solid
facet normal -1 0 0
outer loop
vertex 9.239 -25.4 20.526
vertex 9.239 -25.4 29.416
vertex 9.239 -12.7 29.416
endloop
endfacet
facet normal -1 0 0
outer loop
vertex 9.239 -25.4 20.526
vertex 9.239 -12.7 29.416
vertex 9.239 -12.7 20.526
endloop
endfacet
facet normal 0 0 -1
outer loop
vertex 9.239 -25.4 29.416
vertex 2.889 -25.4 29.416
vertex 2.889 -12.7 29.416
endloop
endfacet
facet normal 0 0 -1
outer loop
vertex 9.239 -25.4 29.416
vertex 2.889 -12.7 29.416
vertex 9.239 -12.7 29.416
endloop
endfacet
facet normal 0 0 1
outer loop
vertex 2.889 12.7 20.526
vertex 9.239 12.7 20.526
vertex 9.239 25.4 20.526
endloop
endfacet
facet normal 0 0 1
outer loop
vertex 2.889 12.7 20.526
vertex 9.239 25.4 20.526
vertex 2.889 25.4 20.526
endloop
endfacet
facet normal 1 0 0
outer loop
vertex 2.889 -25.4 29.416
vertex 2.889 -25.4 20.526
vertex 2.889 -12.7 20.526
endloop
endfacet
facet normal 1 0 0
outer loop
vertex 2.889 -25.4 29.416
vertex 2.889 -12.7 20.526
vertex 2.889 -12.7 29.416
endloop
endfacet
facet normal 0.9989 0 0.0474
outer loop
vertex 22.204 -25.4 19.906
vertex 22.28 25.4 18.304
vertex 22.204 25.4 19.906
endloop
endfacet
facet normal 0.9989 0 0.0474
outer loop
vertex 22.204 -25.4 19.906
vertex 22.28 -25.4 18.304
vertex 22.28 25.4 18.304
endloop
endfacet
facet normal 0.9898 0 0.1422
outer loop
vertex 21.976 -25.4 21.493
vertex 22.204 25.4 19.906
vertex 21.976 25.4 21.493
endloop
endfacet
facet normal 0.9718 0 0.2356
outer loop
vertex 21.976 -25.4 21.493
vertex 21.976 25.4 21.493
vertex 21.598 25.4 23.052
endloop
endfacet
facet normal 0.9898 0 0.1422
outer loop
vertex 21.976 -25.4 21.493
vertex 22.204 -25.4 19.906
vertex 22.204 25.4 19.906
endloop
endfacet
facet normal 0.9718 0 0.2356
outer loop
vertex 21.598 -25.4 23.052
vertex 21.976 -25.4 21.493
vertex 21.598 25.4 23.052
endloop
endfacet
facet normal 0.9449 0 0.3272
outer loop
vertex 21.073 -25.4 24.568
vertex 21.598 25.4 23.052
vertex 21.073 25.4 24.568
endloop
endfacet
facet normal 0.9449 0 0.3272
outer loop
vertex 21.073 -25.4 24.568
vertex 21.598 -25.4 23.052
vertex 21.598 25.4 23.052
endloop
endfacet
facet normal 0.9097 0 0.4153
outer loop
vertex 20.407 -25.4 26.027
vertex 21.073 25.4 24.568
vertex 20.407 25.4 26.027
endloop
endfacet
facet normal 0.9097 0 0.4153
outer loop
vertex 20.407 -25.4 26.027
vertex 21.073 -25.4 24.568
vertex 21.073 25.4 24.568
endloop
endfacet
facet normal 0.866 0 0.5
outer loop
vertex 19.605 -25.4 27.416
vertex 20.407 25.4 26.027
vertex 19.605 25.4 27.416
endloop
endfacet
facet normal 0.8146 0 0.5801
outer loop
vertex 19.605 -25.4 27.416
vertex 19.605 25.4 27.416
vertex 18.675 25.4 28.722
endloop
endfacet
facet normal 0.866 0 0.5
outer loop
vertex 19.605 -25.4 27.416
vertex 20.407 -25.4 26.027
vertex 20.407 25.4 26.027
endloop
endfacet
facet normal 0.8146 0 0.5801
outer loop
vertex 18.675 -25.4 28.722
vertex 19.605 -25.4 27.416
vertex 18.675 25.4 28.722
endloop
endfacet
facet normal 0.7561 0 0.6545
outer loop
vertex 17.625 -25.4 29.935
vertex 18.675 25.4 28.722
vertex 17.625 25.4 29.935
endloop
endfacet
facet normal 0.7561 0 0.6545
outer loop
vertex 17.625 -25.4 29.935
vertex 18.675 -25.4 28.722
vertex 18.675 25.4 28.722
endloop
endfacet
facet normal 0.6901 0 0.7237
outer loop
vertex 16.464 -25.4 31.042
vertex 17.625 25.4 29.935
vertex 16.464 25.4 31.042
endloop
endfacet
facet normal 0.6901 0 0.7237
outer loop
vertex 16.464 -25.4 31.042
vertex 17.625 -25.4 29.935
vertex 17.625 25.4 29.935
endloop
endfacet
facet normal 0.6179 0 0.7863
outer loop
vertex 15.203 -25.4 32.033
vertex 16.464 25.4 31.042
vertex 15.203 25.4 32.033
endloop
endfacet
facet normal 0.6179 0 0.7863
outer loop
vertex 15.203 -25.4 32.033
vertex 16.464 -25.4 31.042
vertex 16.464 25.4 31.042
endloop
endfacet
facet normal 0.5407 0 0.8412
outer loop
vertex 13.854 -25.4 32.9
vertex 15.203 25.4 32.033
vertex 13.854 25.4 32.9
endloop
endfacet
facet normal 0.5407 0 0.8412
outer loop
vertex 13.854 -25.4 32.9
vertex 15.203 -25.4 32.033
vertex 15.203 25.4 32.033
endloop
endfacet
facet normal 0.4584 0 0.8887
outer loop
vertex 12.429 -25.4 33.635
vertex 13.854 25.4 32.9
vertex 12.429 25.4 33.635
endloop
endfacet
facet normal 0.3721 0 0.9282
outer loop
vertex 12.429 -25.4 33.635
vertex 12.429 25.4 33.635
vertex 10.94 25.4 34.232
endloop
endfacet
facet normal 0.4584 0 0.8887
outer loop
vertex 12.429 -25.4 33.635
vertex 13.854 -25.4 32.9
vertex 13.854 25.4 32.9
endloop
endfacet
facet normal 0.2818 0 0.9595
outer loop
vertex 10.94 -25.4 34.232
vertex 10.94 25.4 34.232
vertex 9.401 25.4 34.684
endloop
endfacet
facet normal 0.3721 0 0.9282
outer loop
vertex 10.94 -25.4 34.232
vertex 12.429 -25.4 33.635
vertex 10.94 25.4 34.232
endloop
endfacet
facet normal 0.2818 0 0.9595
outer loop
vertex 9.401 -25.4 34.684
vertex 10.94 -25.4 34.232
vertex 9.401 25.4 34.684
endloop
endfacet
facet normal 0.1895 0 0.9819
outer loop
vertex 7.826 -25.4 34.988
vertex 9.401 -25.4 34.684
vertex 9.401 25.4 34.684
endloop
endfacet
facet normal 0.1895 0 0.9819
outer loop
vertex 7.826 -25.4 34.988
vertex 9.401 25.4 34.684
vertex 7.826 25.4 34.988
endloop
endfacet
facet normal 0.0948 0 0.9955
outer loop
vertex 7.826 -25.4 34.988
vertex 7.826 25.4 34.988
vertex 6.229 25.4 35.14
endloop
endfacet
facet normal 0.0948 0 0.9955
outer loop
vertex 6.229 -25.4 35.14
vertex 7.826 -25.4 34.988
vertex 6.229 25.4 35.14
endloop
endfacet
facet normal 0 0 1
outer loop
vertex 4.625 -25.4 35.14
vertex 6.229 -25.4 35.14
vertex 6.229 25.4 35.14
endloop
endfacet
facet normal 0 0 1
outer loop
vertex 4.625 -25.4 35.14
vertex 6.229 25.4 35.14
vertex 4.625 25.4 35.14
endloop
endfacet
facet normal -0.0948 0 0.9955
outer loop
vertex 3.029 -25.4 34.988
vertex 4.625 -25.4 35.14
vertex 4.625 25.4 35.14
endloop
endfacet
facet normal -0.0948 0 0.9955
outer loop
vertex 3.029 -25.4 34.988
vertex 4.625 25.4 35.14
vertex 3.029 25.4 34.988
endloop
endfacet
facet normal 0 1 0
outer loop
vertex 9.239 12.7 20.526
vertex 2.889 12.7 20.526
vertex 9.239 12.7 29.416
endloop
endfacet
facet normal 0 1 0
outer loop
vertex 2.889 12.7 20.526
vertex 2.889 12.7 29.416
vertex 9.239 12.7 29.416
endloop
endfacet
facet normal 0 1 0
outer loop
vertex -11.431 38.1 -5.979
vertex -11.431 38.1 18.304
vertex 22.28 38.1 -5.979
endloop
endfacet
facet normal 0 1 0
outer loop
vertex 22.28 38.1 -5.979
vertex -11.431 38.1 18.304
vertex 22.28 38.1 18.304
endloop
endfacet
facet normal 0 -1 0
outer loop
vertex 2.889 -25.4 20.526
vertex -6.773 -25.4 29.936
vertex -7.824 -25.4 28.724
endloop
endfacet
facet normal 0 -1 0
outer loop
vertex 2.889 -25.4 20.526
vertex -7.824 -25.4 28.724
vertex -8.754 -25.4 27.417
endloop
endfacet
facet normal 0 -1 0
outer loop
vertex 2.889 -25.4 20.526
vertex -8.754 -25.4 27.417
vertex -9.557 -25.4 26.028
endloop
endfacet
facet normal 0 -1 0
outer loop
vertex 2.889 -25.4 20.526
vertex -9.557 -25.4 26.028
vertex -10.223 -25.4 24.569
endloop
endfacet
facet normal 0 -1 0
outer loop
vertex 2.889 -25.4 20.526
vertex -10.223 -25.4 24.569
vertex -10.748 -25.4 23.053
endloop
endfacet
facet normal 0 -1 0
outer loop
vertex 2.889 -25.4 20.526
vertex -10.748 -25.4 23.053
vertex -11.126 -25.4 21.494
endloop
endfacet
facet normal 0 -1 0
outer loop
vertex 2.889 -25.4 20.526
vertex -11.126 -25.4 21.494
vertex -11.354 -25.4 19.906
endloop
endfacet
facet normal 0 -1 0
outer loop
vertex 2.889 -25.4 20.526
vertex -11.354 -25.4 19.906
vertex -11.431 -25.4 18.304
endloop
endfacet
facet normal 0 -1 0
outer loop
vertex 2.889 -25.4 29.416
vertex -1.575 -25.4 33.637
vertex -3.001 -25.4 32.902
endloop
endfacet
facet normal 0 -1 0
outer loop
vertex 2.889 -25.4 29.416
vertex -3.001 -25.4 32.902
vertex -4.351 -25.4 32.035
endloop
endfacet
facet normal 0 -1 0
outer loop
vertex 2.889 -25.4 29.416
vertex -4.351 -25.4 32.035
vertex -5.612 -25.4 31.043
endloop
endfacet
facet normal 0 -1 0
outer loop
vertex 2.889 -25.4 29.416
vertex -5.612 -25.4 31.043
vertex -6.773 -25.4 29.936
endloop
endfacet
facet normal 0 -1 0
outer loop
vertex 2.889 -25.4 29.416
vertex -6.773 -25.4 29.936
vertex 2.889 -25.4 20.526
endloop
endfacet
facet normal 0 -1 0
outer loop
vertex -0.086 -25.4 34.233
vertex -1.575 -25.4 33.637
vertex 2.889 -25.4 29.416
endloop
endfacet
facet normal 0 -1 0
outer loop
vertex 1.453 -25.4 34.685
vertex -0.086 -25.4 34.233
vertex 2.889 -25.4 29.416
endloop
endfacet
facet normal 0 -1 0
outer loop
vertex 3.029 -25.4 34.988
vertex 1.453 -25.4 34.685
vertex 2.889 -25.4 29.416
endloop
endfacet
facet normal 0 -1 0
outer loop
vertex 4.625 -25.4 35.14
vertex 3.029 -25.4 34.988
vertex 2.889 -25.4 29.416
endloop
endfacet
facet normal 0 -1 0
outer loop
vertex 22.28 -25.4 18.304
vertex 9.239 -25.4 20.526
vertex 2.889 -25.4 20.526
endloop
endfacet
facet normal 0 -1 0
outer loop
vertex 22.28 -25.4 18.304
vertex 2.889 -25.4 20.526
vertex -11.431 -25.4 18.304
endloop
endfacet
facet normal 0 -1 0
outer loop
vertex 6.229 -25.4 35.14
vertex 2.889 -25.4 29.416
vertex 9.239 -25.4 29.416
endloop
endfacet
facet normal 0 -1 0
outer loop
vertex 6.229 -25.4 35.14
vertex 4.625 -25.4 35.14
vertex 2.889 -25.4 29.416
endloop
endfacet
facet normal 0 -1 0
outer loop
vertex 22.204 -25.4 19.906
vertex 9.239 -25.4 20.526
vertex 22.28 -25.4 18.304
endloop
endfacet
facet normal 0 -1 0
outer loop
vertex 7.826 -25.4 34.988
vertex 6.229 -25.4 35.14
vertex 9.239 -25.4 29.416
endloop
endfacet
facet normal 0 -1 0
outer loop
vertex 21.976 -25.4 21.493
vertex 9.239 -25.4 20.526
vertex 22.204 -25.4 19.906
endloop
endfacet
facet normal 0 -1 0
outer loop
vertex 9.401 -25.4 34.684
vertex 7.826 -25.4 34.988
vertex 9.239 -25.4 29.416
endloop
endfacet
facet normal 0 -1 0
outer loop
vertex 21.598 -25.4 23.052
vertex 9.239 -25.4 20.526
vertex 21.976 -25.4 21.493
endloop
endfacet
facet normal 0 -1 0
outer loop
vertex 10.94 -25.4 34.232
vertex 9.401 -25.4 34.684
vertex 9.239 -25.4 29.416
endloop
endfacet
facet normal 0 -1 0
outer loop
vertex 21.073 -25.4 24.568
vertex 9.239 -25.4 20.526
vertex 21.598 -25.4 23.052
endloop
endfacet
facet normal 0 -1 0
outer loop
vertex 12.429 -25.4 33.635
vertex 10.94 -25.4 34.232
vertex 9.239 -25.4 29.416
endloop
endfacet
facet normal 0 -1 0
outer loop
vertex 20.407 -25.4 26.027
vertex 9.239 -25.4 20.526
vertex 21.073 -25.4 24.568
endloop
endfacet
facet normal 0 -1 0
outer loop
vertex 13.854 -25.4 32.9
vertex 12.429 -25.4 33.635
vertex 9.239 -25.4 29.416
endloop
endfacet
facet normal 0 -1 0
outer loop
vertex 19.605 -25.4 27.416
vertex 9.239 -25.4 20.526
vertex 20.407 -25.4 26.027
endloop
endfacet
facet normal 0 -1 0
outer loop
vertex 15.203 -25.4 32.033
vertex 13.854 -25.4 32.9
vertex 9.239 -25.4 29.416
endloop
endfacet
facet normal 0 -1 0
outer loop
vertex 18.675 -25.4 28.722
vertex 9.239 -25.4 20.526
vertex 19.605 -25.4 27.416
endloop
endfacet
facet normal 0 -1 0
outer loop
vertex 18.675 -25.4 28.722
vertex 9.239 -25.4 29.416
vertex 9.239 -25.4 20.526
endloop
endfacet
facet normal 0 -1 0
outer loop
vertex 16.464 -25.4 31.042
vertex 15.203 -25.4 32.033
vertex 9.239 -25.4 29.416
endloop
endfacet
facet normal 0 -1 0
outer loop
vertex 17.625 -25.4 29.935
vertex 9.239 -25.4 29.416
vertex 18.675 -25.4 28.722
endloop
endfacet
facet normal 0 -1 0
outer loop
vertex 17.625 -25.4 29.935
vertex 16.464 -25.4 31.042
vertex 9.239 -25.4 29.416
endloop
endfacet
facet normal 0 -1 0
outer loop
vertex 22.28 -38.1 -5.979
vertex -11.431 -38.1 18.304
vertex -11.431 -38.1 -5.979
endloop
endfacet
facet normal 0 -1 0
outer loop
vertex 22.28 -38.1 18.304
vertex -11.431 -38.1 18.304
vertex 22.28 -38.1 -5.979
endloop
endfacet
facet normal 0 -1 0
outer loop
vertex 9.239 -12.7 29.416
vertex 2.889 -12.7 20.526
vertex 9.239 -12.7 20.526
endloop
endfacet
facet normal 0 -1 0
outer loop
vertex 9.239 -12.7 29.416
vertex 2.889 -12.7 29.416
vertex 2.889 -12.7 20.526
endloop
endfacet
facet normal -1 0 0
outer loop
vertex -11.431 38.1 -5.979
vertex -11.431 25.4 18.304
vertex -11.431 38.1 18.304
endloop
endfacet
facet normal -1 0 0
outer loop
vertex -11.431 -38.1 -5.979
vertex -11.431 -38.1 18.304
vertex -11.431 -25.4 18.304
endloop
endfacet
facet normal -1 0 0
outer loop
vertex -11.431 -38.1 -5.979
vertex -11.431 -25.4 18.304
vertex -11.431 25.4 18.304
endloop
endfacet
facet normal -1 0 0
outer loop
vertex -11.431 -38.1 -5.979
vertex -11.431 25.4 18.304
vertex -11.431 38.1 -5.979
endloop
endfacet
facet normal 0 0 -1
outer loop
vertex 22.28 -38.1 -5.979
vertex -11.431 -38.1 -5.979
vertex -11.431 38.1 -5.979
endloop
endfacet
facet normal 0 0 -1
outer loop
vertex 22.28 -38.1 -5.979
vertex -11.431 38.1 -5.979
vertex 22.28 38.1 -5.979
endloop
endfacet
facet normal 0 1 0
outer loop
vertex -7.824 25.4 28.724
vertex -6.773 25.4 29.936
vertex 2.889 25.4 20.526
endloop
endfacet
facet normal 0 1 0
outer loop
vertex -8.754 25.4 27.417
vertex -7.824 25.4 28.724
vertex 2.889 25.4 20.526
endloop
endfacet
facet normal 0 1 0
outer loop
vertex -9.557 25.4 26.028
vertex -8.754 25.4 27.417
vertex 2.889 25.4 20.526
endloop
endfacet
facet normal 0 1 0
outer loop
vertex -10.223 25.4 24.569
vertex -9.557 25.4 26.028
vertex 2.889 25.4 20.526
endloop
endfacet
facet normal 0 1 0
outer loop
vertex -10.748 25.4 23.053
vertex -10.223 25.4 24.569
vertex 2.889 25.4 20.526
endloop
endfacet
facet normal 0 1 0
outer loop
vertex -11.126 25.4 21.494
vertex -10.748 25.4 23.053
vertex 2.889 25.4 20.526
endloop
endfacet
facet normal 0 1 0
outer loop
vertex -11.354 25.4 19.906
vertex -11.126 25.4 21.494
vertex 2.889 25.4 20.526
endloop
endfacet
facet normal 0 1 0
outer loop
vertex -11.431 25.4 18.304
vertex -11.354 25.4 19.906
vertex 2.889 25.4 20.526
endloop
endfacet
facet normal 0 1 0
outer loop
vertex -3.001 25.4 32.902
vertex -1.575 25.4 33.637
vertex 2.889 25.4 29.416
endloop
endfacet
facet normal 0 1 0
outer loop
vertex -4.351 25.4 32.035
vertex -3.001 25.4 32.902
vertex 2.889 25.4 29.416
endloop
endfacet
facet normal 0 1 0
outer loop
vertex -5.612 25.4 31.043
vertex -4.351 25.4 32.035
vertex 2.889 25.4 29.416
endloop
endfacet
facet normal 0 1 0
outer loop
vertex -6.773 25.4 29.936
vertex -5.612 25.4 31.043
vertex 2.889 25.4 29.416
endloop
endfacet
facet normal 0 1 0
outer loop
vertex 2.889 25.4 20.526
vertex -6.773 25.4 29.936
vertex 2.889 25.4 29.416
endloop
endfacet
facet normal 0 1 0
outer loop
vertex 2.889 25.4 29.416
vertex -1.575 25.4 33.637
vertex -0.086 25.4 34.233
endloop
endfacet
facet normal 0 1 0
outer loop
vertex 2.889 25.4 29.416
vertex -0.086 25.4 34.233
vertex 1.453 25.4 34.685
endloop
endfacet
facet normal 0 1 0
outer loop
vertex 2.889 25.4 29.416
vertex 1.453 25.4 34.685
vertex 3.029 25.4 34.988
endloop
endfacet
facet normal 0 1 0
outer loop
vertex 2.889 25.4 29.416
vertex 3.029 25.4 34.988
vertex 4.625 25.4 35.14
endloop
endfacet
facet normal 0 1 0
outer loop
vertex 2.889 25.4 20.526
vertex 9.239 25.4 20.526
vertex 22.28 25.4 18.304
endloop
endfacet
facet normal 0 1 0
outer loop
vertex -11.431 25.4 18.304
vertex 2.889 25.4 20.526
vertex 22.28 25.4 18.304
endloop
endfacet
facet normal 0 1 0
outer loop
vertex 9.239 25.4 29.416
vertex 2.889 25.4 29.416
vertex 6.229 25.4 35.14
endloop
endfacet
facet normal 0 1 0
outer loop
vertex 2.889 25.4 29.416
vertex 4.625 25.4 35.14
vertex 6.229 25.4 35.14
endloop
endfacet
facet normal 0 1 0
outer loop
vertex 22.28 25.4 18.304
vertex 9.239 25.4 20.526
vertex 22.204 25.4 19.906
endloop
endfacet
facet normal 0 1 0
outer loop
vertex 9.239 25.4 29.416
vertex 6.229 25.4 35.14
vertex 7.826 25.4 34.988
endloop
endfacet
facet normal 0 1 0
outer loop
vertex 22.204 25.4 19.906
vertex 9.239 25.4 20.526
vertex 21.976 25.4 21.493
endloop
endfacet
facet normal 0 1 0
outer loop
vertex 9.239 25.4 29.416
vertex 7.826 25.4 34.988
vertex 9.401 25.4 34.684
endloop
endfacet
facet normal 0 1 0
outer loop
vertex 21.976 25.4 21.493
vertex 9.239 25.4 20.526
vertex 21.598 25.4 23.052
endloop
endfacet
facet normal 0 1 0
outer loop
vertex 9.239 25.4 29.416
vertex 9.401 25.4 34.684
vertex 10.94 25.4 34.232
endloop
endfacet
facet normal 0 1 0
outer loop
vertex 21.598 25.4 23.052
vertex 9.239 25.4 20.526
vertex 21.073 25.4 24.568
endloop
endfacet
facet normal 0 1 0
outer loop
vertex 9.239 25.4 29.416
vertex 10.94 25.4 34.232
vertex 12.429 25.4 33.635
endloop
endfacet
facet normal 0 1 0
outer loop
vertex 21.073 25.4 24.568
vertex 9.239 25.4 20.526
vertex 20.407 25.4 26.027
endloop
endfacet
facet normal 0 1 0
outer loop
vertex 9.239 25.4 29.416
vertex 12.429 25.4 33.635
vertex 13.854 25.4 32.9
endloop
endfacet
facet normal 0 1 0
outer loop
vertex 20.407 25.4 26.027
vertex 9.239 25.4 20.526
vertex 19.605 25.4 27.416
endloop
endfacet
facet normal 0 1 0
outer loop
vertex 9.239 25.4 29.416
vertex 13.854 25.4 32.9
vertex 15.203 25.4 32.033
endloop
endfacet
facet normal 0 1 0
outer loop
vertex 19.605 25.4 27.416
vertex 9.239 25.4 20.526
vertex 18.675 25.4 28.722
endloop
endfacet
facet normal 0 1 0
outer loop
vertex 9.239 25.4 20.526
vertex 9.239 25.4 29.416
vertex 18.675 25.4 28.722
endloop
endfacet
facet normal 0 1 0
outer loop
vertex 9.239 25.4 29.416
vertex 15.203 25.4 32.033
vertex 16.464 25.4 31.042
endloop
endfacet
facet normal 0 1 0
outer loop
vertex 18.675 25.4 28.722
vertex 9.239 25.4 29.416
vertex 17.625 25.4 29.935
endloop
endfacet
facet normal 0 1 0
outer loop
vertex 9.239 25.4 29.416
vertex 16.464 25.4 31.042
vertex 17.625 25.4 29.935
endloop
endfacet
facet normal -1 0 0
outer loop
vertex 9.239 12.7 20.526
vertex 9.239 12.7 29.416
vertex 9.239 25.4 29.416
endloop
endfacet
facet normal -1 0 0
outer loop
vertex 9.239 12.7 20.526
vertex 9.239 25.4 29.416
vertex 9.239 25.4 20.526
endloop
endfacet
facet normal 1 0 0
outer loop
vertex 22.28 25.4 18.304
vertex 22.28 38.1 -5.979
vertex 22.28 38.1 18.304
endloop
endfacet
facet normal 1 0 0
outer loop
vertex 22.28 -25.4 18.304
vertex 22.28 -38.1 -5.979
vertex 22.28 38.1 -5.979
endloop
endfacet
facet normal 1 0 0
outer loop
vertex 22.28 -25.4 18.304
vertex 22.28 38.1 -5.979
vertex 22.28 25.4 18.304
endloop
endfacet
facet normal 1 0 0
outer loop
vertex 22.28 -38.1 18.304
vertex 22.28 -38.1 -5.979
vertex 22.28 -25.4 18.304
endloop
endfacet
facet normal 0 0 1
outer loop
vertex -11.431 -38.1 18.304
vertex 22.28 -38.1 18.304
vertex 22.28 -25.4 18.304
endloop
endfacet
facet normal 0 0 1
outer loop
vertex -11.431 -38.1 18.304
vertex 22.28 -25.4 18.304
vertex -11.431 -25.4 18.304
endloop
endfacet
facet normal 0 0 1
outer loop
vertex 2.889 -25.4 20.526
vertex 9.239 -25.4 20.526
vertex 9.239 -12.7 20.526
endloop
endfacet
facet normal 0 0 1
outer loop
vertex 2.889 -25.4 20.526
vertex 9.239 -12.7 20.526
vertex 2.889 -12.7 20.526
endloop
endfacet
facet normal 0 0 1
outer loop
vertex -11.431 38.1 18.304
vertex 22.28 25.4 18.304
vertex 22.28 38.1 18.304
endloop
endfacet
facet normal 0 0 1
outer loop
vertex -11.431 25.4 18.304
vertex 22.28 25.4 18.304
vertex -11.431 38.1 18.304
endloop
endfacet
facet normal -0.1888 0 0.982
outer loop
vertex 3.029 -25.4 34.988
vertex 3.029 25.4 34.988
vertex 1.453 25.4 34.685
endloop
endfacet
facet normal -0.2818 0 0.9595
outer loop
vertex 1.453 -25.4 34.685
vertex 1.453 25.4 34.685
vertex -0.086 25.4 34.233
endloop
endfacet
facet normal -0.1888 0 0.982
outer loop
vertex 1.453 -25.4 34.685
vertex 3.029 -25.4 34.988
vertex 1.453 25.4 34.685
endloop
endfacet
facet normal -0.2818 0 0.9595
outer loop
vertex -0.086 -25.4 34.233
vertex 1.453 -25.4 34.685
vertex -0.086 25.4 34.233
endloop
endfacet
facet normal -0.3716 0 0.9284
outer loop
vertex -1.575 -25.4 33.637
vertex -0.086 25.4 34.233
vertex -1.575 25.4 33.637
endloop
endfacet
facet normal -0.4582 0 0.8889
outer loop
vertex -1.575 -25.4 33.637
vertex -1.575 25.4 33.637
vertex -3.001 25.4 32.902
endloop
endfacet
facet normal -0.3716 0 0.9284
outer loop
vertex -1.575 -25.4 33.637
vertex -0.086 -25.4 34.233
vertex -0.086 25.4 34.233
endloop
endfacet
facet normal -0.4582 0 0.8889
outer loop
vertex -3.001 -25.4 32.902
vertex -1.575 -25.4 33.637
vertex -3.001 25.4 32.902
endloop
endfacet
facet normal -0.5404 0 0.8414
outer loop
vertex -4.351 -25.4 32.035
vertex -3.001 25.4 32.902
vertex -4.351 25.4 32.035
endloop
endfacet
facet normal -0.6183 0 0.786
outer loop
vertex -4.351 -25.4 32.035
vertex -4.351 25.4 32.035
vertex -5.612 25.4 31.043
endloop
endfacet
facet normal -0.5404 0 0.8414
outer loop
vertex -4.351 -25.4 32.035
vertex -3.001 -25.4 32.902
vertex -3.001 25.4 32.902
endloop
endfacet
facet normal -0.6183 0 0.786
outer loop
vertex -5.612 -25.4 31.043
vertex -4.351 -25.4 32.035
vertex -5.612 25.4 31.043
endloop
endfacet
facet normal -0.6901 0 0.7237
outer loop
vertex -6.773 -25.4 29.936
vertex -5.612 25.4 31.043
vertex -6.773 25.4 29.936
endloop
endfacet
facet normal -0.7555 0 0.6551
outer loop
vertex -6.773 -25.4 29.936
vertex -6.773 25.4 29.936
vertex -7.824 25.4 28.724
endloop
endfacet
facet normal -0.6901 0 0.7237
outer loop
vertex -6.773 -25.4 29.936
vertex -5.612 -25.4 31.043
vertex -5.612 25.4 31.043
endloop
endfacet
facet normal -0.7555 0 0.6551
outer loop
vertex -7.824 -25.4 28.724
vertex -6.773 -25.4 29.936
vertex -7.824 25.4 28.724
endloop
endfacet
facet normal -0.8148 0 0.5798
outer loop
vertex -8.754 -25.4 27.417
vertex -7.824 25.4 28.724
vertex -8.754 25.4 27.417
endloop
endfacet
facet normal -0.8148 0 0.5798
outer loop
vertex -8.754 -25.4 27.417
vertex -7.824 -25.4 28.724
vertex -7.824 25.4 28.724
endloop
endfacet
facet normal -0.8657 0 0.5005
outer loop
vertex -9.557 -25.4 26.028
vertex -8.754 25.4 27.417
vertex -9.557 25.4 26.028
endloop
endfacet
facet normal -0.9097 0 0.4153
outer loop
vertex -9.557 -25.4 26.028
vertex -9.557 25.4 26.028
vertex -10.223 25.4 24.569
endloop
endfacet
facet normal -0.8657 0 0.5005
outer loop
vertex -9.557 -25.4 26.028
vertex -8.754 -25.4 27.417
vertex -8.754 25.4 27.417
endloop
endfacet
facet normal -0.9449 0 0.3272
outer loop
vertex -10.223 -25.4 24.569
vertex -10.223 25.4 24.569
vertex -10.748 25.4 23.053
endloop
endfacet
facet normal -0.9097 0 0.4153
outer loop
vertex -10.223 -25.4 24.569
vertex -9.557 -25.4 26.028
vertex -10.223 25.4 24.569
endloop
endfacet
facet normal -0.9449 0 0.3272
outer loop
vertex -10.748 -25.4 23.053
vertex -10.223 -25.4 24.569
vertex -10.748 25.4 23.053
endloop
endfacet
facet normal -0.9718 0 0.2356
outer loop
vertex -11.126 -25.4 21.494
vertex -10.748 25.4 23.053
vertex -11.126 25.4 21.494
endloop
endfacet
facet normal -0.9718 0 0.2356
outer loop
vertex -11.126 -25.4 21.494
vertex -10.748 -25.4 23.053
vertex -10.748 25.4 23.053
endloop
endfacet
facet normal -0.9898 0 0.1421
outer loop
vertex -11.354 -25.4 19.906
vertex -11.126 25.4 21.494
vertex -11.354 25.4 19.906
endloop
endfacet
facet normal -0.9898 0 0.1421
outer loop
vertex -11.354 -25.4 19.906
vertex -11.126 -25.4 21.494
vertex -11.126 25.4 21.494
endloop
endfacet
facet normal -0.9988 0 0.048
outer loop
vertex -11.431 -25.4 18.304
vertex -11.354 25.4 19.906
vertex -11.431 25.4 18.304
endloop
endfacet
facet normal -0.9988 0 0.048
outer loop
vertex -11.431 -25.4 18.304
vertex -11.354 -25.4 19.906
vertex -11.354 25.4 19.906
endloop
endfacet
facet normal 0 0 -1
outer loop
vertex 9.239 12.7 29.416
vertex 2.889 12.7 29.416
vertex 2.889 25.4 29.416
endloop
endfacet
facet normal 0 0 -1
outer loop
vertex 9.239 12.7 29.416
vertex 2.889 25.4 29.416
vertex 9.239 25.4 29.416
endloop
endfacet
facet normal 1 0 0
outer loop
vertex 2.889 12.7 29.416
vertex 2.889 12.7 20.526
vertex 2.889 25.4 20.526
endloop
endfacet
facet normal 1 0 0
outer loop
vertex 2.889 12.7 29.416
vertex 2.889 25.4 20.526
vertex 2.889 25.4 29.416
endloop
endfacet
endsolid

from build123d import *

# Parameters (mm, degrees)
F1_DEPTH = 38.1
F2_DEPTH = 25.4
F3_DEPTH = 12.7


with BuildPart() as f1:
    # F0 (on Front) → F1 (new body, symmetric)
    with BuildSketch(Plane.XZ):
        Polygon((7.498131, 18.303821), (-11.430653, 18.303821), (-11.430653, -5.979048), (22.280489, -5.979048), (22.280489, 18.303821), (14.65952, 18.303821), align=None)
    extrude(amount=F1_DEPTH, both=True)

    # F0 (on Front) → F2 (join, symmetric)
    with BuildSketch(Plane.XZ):
        Polygon((7.498131, 20.526321), (7.498131, 18.303821), (14.65952, 18.303821), (14.65952, 20.526321), (9.238502, 20.526321), align=None)
        with BuildLine():
            ThreePointArc((3.028655, 34.988191), (-7.312834, 29.34284), (-11.430653, 18.303821))
            Line((-11.430653, 18.303821), (7.498131, 18.303821))
            Line((7.498131, 18.303821), (7.498131, 20.526321))
            Line((7.498131, 20.526321), (2.888502, 20.526321))
            Line((2.888502, 20.526321), (2.888502, 29.416321))
            Line((2.888502, 29.416321), (9.238502, 29.416321))
            Line((9.238502, 29.416321), (9.238502, 20.526321))
            Line((9.238502, 20.526321), (14.65952, 20.526321))
            Line((14.65952, 20.526321), (14.65952, 18.303821))
            Line((14.65952, 18.303821), (22.280489, 18.303821))
            ThreePointArc((22.280489, 18.303821), (16.463937, 31.041573), (3.028655, 34.988191))
        make_face()
    extrude(amount=F2_DEPTH, both=True)

    # F0 (on Front) → F3 (join, symmetric)
    with BuildSketch(Plane.XZ):
        Polygon((2.888502, 20.526321), (7.498131, 20.526321), (9.238502, 20.526321), (9.238502, 29.416321), (2.888502, 29.416321), align=None)
    extrude(amount=F3_DEPTH, both=True)


solid = f1.part
